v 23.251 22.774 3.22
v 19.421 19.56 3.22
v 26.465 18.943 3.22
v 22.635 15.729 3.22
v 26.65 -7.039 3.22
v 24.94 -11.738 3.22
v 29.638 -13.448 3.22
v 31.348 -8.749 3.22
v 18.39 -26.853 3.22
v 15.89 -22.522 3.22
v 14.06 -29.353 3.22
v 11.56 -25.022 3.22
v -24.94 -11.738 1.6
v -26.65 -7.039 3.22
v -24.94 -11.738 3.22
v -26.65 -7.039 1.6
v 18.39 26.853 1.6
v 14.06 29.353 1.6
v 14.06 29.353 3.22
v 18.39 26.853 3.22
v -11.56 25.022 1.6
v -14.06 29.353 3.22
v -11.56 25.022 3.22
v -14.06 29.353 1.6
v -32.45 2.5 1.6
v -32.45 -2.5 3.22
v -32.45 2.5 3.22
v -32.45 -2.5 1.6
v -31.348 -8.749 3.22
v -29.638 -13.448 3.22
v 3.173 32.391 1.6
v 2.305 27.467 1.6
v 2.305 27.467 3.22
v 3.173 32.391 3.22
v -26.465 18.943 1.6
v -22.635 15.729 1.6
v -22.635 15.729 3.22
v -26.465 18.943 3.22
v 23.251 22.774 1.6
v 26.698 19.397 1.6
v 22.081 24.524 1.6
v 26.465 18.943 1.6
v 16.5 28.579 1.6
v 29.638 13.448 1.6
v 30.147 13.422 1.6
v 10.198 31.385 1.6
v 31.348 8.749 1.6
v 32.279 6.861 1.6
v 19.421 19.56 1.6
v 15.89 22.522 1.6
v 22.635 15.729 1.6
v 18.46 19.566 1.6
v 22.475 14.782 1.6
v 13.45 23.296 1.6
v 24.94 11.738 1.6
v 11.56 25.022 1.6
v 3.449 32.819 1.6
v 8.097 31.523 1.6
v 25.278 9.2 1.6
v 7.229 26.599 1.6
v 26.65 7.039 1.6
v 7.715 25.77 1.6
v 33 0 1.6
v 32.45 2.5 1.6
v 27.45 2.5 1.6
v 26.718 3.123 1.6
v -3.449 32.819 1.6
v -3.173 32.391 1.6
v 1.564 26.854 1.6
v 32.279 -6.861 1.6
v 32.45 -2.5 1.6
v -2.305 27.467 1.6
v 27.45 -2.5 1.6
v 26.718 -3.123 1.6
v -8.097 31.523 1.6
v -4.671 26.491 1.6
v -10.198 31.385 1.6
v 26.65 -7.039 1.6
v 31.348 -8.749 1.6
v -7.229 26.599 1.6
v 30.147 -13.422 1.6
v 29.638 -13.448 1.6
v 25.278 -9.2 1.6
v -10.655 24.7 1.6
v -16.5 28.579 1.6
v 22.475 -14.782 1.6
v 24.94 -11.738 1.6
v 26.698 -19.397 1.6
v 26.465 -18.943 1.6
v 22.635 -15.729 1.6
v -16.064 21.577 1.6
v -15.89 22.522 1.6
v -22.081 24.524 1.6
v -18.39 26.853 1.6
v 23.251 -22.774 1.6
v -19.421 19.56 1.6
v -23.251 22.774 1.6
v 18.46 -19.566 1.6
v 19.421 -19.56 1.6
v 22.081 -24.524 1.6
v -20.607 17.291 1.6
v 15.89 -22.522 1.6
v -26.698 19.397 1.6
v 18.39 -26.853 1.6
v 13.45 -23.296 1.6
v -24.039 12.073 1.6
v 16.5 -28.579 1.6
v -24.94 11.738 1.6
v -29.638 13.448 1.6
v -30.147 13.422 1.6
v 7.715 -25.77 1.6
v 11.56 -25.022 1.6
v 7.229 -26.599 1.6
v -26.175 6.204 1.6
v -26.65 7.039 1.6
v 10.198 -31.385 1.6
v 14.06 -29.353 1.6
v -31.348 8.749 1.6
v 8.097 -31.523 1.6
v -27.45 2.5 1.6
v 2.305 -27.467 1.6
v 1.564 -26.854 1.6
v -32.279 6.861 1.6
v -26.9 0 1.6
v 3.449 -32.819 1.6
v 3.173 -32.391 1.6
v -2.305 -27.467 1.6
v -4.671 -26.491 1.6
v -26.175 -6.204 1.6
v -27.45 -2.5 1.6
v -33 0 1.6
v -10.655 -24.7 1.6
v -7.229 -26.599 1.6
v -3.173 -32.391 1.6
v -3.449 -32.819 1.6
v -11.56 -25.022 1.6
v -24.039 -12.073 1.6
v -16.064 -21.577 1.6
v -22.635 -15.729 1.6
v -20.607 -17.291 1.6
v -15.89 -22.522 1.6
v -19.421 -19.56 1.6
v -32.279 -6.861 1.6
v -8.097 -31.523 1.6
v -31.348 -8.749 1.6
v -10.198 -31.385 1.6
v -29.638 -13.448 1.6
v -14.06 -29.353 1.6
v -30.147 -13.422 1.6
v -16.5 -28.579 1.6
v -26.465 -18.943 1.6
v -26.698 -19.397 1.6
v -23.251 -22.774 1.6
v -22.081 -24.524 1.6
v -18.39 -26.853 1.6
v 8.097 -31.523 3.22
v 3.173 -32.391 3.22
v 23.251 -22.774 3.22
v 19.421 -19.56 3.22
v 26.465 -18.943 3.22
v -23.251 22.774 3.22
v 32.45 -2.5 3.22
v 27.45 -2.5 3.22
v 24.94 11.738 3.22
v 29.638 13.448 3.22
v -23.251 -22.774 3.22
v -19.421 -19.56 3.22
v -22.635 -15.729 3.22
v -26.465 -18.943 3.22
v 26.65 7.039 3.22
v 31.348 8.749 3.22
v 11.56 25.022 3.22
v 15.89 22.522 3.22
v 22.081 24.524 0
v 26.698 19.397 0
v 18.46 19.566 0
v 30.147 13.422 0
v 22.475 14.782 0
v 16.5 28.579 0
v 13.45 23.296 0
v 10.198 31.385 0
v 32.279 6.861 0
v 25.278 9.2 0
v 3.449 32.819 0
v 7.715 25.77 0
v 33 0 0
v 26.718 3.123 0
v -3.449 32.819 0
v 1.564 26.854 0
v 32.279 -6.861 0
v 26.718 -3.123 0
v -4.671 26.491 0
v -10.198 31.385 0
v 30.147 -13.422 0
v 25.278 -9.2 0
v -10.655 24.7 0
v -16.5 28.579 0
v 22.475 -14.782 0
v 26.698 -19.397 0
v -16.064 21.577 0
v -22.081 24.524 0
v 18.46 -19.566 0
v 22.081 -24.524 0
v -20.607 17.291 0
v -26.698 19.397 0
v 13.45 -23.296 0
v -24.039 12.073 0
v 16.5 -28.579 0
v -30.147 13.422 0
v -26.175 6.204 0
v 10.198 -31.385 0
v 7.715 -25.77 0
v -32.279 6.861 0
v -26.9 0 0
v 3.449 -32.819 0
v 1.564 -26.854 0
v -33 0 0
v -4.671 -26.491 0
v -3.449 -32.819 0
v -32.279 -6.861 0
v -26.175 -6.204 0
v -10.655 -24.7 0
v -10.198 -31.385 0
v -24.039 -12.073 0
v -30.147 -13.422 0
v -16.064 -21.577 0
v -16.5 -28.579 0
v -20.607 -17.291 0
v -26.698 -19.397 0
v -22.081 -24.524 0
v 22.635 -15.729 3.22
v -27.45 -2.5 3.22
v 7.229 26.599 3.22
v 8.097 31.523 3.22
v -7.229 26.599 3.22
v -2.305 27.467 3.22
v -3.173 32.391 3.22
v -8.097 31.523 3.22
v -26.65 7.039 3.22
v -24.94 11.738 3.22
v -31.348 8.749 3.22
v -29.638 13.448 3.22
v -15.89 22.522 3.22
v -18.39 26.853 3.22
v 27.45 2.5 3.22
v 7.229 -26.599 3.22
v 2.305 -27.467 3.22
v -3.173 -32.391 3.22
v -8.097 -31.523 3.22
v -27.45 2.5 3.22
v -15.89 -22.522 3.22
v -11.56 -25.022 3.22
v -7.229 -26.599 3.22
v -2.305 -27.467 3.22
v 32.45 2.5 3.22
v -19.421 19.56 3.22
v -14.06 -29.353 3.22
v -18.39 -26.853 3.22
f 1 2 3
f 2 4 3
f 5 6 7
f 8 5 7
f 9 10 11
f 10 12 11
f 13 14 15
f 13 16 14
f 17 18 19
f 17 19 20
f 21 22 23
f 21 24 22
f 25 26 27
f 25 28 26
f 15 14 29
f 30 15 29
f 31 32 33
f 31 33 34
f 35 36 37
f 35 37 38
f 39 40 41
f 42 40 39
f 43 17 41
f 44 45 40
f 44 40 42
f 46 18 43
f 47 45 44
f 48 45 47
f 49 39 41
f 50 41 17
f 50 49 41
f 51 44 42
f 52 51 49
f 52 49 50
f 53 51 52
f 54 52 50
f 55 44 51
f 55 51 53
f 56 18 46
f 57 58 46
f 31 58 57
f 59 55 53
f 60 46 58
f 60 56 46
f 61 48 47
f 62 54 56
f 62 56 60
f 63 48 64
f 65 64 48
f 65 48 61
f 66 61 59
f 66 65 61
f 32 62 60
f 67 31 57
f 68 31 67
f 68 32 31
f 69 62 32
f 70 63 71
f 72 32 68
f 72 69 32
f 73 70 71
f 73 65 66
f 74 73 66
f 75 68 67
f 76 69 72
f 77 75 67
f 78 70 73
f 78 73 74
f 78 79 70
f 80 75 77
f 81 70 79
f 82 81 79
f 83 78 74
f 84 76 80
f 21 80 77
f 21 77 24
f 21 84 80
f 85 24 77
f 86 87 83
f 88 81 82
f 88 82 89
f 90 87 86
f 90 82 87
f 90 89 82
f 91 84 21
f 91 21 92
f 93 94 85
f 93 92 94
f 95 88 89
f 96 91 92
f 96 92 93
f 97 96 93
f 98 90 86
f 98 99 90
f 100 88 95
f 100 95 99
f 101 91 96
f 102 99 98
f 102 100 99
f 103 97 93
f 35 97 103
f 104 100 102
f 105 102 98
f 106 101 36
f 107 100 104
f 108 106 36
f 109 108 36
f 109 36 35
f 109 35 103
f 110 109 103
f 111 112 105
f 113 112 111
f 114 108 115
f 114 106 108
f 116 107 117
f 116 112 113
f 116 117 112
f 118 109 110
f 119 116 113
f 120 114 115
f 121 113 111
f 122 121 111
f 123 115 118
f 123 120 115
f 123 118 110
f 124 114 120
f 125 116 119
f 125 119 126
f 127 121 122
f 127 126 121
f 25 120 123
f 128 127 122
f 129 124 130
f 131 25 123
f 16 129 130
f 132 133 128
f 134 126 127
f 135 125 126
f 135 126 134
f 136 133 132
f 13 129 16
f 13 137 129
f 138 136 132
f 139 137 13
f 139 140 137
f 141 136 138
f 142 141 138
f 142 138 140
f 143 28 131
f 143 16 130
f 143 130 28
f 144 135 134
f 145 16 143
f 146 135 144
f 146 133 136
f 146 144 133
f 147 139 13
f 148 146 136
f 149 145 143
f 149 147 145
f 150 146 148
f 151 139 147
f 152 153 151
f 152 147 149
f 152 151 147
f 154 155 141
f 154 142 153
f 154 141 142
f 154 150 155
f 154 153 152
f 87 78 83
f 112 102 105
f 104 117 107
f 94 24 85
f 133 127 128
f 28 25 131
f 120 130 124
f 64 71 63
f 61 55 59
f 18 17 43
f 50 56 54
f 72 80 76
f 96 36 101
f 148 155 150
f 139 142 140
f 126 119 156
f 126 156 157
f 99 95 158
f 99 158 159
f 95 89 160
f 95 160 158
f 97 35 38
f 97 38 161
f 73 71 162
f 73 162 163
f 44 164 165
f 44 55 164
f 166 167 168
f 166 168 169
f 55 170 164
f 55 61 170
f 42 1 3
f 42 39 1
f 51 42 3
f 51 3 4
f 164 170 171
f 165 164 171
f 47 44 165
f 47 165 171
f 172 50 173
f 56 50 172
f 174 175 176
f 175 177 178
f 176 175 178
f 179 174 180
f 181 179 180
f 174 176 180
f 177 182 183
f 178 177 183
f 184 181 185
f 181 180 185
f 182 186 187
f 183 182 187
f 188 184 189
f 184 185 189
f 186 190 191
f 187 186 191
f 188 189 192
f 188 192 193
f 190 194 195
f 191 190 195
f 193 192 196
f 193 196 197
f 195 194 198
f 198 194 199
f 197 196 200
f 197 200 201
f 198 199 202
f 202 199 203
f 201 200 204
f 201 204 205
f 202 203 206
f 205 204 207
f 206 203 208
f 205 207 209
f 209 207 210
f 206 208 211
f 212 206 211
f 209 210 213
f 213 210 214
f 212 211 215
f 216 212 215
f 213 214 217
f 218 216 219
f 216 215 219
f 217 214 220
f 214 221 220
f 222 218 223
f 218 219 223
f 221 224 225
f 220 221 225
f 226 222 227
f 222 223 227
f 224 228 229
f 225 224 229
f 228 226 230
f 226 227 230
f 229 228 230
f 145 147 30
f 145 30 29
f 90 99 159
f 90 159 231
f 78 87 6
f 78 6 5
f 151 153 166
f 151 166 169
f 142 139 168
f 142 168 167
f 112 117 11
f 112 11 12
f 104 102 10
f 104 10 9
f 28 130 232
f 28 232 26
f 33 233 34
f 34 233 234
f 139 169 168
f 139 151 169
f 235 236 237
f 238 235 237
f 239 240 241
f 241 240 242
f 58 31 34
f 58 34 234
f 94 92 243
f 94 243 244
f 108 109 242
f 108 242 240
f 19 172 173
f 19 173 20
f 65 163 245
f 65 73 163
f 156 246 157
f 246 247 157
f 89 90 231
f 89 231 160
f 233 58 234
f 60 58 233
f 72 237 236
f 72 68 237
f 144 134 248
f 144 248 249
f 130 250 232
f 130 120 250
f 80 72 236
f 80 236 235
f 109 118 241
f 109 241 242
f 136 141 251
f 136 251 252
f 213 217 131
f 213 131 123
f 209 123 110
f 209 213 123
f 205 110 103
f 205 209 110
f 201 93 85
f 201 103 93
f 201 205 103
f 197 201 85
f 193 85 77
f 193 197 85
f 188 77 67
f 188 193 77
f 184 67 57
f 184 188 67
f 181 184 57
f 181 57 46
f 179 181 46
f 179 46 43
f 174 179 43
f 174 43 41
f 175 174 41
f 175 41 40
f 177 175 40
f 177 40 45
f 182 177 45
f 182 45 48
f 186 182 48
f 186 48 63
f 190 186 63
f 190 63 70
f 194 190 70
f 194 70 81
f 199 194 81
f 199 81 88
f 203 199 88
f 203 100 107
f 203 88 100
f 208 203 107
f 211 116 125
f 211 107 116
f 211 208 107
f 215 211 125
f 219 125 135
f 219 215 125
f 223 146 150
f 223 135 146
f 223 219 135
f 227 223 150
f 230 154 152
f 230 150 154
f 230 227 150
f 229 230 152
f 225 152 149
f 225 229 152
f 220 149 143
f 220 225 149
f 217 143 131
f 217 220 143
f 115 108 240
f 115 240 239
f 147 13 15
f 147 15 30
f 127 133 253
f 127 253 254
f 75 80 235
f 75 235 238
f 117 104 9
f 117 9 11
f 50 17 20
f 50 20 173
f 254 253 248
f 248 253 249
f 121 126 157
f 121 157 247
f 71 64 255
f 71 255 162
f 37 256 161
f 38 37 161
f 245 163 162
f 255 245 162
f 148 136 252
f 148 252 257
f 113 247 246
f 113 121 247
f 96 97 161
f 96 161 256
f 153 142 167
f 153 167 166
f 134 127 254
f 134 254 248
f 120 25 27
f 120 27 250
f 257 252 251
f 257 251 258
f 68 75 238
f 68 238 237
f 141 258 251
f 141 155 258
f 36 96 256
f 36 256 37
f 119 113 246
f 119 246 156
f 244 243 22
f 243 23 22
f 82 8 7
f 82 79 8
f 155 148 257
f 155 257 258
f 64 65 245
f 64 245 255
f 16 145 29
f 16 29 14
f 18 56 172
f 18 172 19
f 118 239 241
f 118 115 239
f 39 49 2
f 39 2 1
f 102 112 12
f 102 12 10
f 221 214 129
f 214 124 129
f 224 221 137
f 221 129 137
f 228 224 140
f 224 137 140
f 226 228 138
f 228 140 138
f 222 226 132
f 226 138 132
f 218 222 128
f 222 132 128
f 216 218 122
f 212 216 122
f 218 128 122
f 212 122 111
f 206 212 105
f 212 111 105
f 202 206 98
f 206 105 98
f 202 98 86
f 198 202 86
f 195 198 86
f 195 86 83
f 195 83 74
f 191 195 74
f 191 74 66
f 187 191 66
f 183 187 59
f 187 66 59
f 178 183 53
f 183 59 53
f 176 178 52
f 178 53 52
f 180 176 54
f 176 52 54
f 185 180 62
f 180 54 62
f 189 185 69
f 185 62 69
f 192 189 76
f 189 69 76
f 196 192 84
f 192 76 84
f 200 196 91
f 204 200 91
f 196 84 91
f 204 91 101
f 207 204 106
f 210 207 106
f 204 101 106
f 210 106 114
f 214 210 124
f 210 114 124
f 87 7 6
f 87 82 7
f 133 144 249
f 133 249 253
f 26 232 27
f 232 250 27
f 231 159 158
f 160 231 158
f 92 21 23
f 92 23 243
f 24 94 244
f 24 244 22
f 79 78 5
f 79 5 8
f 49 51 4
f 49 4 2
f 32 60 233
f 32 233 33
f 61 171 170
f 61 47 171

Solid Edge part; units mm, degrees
sketch "Sketch1" plane through (0, 0, 0) normal (0, -1, 0) x (1, 0, 0)
  line L0 (-33, 1.6) -> (-33, 0)
  line L1 (-33, 0) -> (-26.9, 0)
  line L2 (-26.9, 0) -> (-26.9, 1.6)
  line L3 (-26.9, 1.6) -> (-33, 1.6)
  dimension "D1" = 1.6
revolve "RevolvedProtrusion1" add sketch "Sketch1" angle 360 about axis through (0, 0, 0) along (0, 0, 1)
sketch "Sketch2" plane through (0, 0, 1.6) normal (0, 0, 1) x (1, 0, 0)
  line L0 (-32.45, 2.5) -> (-27.45, 2.5)
  line L1 (-27.45, 2.5) -> (-27.45, -2.5)
  line L2 (-27.45, -2.5) -> (-32.45, -2.5)
  line L3 (-32.45, -2.5) -> (-32.45, 2.5)
  dimension "D1" = 3.05
  dimension "D2" = 5
  dimension "D3" = 5
extrude "Protrusion1" add sketch "Sketch2" along normal blind 1.62
pattern_circular "Pattern1" count 18 over 360 about axis through (0, 0, 1.6) along (0, 0, 1) of "Protrusion1"
